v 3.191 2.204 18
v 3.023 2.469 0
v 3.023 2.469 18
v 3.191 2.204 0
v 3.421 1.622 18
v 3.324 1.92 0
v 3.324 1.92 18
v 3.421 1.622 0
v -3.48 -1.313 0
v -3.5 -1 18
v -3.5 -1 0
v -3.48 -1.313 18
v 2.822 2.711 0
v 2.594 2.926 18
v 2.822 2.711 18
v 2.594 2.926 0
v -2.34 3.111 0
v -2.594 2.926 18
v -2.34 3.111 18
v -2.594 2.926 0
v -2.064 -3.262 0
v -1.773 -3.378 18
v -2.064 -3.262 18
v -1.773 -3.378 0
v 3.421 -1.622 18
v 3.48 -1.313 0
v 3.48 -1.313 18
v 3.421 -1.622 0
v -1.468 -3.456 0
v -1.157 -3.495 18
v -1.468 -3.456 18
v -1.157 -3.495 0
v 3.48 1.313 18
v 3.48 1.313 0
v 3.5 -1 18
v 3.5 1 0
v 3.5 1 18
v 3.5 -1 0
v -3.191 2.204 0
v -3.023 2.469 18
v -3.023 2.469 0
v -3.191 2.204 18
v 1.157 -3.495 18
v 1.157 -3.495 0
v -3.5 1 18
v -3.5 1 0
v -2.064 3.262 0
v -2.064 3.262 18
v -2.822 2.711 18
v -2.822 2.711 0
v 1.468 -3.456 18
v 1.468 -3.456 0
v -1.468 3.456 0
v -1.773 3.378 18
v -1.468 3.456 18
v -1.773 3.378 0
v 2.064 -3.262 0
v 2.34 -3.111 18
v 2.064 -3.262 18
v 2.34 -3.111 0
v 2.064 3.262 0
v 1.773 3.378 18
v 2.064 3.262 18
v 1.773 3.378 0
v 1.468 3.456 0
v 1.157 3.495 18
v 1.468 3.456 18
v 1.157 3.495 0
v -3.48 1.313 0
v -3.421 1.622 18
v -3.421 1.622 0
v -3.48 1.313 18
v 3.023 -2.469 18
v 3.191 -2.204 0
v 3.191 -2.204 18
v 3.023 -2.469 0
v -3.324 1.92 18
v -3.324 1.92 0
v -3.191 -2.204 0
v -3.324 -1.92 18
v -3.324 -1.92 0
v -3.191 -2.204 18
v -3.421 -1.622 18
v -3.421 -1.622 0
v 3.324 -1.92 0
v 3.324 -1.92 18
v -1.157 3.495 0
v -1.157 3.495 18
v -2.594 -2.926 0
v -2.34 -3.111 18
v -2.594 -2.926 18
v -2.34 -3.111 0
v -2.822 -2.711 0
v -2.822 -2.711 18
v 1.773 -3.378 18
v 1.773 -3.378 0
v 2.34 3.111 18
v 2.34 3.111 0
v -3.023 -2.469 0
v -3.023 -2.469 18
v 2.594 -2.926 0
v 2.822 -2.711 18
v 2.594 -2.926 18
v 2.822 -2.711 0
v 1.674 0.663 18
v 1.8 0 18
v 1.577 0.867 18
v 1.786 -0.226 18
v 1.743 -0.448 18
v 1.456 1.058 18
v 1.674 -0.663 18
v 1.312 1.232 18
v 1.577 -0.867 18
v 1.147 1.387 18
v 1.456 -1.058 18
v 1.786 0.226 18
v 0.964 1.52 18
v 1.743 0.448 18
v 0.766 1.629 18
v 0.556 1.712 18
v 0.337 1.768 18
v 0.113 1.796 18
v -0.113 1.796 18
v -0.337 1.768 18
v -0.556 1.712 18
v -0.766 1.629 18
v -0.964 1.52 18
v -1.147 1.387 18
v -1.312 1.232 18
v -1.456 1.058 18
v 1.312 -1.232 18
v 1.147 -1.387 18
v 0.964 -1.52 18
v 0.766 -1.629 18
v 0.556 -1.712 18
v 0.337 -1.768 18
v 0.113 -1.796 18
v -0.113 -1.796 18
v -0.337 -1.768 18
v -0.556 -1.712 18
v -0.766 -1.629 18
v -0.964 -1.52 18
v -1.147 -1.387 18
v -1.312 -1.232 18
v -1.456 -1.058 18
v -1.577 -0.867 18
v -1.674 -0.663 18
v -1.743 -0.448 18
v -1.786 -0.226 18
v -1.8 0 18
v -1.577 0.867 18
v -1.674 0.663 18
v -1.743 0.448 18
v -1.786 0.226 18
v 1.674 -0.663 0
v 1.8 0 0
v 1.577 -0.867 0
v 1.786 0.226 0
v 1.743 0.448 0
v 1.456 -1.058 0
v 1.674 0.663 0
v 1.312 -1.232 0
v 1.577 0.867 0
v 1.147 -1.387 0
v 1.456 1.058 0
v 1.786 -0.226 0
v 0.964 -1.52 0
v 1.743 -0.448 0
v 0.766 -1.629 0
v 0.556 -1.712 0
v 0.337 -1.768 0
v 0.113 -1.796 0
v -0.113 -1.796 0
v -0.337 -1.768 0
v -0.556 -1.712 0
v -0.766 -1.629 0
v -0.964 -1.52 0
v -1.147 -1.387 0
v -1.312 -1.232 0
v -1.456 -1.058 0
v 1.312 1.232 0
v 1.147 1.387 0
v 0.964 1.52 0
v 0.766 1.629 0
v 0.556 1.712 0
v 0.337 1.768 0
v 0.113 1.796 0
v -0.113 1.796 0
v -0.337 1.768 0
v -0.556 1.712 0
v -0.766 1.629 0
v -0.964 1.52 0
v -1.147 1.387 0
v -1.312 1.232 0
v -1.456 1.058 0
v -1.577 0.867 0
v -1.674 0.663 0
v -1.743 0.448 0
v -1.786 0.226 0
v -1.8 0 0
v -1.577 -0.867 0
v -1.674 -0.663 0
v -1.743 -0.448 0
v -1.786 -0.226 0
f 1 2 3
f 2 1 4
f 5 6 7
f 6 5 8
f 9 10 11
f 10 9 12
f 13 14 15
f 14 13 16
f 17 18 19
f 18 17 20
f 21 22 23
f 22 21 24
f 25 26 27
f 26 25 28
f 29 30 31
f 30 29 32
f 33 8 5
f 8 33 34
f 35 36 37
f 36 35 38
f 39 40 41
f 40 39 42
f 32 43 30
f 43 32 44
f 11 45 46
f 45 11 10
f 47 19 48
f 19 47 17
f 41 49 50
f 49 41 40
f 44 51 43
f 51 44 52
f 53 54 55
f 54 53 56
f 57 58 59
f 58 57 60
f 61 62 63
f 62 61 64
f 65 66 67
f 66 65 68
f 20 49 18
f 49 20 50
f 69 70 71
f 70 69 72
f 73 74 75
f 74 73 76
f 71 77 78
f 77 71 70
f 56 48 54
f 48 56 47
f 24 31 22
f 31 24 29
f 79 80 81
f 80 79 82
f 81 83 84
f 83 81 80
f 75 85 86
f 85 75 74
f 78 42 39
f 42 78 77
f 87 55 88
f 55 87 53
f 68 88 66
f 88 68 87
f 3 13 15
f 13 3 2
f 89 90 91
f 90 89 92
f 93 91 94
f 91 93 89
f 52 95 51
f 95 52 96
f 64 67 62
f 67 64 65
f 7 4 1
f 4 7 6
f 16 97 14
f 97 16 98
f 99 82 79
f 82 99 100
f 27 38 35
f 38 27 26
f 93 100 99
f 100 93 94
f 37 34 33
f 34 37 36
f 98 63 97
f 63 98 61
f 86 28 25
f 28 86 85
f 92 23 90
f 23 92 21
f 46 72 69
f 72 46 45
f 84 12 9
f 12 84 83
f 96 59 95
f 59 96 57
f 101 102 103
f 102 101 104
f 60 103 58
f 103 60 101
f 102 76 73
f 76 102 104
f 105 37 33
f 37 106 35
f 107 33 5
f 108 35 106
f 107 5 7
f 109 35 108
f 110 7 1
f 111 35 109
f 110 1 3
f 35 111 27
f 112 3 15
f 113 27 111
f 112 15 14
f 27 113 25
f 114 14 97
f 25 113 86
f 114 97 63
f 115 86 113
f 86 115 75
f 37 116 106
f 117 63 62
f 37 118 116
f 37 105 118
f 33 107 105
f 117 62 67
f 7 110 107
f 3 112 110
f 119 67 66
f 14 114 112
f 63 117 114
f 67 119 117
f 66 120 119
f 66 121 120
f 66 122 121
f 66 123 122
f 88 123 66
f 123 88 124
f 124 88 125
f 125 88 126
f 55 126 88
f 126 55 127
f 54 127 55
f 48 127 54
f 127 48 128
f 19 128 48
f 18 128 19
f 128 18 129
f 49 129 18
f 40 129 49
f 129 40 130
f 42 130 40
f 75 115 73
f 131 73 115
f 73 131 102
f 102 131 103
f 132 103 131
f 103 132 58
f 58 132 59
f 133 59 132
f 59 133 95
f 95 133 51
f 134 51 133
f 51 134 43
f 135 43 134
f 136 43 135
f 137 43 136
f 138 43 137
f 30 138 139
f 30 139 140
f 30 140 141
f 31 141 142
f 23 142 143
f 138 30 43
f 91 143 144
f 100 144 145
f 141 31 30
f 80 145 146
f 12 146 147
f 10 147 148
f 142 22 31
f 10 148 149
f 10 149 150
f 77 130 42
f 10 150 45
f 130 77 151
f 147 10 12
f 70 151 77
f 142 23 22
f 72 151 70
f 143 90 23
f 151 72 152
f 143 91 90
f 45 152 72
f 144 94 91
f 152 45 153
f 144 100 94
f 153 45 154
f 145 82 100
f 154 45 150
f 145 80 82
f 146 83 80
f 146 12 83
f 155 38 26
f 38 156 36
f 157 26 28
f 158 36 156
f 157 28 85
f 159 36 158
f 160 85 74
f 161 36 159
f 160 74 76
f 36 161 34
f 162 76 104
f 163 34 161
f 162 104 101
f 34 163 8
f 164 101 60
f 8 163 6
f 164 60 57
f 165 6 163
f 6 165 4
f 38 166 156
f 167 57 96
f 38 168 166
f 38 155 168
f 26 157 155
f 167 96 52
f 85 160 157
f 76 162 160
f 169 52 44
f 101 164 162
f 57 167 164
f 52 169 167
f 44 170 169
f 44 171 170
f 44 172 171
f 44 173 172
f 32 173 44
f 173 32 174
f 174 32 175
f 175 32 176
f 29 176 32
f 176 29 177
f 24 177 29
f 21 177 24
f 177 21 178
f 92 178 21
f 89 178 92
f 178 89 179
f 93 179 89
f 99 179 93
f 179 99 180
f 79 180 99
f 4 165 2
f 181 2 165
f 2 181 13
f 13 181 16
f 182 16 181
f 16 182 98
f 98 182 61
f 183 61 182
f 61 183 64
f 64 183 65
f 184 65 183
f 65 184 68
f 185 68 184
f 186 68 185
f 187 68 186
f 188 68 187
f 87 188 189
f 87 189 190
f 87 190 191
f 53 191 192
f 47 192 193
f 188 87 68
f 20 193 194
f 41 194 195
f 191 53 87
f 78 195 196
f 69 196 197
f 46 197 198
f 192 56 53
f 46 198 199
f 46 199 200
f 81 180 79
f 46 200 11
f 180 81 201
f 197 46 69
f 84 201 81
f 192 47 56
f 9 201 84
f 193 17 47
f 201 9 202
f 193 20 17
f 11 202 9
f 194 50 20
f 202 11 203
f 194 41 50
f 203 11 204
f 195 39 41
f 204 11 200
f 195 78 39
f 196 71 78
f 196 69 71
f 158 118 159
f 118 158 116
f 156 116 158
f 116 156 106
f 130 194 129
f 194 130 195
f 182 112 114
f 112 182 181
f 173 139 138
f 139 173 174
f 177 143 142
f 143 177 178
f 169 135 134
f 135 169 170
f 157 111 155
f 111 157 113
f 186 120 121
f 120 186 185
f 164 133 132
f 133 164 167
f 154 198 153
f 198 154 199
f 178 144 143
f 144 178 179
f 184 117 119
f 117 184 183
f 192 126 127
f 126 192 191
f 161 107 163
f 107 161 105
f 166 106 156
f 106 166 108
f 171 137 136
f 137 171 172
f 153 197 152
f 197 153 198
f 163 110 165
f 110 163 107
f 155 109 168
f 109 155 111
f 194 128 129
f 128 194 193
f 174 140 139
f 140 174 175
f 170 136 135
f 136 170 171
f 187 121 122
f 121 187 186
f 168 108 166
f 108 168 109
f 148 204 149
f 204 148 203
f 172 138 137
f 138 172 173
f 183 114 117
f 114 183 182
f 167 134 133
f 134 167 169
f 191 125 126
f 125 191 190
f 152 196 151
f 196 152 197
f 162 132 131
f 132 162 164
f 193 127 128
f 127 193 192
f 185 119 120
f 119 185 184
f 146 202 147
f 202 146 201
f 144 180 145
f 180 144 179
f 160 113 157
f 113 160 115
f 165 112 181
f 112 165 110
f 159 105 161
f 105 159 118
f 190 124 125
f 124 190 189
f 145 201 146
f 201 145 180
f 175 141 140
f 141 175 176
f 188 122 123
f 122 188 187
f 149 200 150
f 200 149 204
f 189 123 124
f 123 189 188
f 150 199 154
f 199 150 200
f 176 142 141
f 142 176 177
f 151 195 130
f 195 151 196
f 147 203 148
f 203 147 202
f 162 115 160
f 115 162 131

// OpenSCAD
$fn = 50;


difference() {
	union() {
		translate(v = [0, 0, 0]) {
			rotate(a = [0, 0, 0]) {
				hull() {
					translate(v = [-1.0000000000, 1.0000000000, 0]) {
						rotate(a = [0, 0, 0]) {
							translate(v = [0, 0, 0]) {
								rotate(a = [0, 0, 0]) {
									cylinder(h = 18, r = 2.5000000000);
								}
							}
						}
					}
					translate(v = [1.0000000000, 1.0000000000, 0]) {
						rotate(a = [0, 0, 0]) {
							translate(v = [0, 0, 0]) {
								rotate(a = [0, 0, 0]) {
									cylinder(h = 18, r = 2.5000000000);
								}
							}
						}
					}
					translate(v = [-1.0000000000, -1.0000000000, 0]) {
						rotate(a = [0, 0, 0]) {
							translate(v = [0, 0, 0]) {
								rotate(a = [0, 0, 0]) {
									cylinder(h = 18, r = 2.5000000000);
								}
							}
						}
					}
					translate(v = [1.0000000000, -1.0000000000, 0]) {
						rotate(a = [0, 0, 0]) {
							translate(v = [0, 0, 0]) {
								rotate(a = [0, 0, 0]) {
									cylinder(h = 18, r = 2.5000000000);
								}
							}
						}
					}
				}
			}
		}
	}
	union() {
		translate(v = [0.0000000000, 0.0000000000, 0]) {
			rotate(a = [0, 0, 0]) {
				translate(v = [0, 0, -50]) {
					rotate(a = [0, 0, 0]) {
						cylinder(h = 100, r = 1.8000000000);
					}
				}
			}
		}
	}
}
